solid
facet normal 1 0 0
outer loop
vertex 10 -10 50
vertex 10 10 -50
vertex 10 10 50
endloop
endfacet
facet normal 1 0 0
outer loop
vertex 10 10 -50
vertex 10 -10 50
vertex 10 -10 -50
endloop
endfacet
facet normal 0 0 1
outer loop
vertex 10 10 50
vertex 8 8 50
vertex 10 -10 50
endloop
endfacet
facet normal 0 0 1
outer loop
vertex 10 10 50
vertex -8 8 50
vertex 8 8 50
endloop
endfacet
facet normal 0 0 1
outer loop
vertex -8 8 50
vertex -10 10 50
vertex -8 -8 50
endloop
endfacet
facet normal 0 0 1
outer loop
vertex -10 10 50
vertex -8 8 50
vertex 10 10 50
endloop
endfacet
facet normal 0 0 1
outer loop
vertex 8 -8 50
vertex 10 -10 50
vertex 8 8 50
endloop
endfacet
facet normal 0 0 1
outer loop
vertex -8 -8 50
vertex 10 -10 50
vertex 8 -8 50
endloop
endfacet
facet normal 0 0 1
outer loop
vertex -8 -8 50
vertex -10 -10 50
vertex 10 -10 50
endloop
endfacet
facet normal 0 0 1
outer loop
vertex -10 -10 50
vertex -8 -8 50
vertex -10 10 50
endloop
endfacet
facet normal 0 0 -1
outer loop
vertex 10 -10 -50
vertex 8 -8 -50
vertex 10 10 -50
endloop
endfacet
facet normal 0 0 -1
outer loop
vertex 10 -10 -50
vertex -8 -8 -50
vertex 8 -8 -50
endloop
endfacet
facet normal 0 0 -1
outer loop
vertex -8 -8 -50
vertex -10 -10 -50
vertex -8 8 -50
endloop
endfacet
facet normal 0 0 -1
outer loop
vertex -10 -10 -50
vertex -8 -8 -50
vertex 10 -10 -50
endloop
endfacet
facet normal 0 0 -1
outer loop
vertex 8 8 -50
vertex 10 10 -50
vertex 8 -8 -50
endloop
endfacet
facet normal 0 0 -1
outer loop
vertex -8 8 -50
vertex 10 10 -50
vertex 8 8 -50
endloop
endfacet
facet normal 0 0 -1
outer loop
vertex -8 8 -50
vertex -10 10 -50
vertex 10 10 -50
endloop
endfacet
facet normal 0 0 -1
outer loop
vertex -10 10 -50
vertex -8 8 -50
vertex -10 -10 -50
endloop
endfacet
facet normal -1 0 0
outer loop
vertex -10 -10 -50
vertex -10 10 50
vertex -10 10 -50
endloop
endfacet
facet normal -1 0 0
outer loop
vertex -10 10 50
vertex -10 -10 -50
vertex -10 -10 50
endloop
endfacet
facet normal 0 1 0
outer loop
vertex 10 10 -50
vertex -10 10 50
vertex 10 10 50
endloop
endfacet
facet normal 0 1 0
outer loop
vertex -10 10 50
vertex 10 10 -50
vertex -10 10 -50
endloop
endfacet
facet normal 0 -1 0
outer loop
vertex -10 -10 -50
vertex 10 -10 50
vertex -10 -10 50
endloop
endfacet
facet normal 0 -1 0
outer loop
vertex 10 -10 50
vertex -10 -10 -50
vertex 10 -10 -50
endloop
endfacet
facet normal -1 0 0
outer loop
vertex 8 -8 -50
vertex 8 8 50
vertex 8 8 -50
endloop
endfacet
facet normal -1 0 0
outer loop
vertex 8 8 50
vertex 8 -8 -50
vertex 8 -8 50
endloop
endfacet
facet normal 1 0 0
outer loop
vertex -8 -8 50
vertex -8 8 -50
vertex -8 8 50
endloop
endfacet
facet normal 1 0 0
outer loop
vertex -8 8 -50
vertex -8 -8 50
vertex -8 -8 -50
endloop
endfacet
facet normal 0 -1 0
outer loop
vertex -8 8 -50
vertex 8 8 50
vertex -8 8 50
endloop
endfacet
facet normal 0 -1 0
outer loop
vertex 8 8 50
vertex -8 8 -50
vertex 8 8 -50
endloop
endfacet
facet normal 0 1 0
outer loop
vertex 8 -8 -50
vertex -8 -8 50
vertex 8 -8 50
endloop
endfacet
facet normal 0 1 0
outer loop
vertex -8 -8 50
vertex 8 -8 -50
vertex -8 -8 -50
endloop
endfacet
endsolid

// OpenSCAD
// Aluminium rectangular box section 20mm x 20mm x 2mm

outer_width_mm     = 20;   //[10:40:1]
outer_height_mm    = 20;   //[10:40:1]
wall_thickness_mm  = 2;    //[1:6:0.5]
length_mm          = 100;  //[50:300:1]
overlap_mm         = 1;    //[0.5:2:0.5]

module box_section(ow, oh, t, L, overlap=1) {
    // Ensure valid wall thickness
    t_eff = min(t, ow/2 - 0.01, oh/2 - 0.01);

    iw = ow - 2*t_eff;
    ih = oh - 2*t_eff;

    // Inner void is longer so it cleanly cuts through both ends
    inner_L = L + 2*overlap;

    color("Silver")
    difference() {
        cube([ow, oh, L], center=true);
        cube([iw, ih, inner_L], center=true);
    }
}

box_section(outer_width_mm, outer_height_mm, wall_thickness_mm, length_mm, overlap_mm);
